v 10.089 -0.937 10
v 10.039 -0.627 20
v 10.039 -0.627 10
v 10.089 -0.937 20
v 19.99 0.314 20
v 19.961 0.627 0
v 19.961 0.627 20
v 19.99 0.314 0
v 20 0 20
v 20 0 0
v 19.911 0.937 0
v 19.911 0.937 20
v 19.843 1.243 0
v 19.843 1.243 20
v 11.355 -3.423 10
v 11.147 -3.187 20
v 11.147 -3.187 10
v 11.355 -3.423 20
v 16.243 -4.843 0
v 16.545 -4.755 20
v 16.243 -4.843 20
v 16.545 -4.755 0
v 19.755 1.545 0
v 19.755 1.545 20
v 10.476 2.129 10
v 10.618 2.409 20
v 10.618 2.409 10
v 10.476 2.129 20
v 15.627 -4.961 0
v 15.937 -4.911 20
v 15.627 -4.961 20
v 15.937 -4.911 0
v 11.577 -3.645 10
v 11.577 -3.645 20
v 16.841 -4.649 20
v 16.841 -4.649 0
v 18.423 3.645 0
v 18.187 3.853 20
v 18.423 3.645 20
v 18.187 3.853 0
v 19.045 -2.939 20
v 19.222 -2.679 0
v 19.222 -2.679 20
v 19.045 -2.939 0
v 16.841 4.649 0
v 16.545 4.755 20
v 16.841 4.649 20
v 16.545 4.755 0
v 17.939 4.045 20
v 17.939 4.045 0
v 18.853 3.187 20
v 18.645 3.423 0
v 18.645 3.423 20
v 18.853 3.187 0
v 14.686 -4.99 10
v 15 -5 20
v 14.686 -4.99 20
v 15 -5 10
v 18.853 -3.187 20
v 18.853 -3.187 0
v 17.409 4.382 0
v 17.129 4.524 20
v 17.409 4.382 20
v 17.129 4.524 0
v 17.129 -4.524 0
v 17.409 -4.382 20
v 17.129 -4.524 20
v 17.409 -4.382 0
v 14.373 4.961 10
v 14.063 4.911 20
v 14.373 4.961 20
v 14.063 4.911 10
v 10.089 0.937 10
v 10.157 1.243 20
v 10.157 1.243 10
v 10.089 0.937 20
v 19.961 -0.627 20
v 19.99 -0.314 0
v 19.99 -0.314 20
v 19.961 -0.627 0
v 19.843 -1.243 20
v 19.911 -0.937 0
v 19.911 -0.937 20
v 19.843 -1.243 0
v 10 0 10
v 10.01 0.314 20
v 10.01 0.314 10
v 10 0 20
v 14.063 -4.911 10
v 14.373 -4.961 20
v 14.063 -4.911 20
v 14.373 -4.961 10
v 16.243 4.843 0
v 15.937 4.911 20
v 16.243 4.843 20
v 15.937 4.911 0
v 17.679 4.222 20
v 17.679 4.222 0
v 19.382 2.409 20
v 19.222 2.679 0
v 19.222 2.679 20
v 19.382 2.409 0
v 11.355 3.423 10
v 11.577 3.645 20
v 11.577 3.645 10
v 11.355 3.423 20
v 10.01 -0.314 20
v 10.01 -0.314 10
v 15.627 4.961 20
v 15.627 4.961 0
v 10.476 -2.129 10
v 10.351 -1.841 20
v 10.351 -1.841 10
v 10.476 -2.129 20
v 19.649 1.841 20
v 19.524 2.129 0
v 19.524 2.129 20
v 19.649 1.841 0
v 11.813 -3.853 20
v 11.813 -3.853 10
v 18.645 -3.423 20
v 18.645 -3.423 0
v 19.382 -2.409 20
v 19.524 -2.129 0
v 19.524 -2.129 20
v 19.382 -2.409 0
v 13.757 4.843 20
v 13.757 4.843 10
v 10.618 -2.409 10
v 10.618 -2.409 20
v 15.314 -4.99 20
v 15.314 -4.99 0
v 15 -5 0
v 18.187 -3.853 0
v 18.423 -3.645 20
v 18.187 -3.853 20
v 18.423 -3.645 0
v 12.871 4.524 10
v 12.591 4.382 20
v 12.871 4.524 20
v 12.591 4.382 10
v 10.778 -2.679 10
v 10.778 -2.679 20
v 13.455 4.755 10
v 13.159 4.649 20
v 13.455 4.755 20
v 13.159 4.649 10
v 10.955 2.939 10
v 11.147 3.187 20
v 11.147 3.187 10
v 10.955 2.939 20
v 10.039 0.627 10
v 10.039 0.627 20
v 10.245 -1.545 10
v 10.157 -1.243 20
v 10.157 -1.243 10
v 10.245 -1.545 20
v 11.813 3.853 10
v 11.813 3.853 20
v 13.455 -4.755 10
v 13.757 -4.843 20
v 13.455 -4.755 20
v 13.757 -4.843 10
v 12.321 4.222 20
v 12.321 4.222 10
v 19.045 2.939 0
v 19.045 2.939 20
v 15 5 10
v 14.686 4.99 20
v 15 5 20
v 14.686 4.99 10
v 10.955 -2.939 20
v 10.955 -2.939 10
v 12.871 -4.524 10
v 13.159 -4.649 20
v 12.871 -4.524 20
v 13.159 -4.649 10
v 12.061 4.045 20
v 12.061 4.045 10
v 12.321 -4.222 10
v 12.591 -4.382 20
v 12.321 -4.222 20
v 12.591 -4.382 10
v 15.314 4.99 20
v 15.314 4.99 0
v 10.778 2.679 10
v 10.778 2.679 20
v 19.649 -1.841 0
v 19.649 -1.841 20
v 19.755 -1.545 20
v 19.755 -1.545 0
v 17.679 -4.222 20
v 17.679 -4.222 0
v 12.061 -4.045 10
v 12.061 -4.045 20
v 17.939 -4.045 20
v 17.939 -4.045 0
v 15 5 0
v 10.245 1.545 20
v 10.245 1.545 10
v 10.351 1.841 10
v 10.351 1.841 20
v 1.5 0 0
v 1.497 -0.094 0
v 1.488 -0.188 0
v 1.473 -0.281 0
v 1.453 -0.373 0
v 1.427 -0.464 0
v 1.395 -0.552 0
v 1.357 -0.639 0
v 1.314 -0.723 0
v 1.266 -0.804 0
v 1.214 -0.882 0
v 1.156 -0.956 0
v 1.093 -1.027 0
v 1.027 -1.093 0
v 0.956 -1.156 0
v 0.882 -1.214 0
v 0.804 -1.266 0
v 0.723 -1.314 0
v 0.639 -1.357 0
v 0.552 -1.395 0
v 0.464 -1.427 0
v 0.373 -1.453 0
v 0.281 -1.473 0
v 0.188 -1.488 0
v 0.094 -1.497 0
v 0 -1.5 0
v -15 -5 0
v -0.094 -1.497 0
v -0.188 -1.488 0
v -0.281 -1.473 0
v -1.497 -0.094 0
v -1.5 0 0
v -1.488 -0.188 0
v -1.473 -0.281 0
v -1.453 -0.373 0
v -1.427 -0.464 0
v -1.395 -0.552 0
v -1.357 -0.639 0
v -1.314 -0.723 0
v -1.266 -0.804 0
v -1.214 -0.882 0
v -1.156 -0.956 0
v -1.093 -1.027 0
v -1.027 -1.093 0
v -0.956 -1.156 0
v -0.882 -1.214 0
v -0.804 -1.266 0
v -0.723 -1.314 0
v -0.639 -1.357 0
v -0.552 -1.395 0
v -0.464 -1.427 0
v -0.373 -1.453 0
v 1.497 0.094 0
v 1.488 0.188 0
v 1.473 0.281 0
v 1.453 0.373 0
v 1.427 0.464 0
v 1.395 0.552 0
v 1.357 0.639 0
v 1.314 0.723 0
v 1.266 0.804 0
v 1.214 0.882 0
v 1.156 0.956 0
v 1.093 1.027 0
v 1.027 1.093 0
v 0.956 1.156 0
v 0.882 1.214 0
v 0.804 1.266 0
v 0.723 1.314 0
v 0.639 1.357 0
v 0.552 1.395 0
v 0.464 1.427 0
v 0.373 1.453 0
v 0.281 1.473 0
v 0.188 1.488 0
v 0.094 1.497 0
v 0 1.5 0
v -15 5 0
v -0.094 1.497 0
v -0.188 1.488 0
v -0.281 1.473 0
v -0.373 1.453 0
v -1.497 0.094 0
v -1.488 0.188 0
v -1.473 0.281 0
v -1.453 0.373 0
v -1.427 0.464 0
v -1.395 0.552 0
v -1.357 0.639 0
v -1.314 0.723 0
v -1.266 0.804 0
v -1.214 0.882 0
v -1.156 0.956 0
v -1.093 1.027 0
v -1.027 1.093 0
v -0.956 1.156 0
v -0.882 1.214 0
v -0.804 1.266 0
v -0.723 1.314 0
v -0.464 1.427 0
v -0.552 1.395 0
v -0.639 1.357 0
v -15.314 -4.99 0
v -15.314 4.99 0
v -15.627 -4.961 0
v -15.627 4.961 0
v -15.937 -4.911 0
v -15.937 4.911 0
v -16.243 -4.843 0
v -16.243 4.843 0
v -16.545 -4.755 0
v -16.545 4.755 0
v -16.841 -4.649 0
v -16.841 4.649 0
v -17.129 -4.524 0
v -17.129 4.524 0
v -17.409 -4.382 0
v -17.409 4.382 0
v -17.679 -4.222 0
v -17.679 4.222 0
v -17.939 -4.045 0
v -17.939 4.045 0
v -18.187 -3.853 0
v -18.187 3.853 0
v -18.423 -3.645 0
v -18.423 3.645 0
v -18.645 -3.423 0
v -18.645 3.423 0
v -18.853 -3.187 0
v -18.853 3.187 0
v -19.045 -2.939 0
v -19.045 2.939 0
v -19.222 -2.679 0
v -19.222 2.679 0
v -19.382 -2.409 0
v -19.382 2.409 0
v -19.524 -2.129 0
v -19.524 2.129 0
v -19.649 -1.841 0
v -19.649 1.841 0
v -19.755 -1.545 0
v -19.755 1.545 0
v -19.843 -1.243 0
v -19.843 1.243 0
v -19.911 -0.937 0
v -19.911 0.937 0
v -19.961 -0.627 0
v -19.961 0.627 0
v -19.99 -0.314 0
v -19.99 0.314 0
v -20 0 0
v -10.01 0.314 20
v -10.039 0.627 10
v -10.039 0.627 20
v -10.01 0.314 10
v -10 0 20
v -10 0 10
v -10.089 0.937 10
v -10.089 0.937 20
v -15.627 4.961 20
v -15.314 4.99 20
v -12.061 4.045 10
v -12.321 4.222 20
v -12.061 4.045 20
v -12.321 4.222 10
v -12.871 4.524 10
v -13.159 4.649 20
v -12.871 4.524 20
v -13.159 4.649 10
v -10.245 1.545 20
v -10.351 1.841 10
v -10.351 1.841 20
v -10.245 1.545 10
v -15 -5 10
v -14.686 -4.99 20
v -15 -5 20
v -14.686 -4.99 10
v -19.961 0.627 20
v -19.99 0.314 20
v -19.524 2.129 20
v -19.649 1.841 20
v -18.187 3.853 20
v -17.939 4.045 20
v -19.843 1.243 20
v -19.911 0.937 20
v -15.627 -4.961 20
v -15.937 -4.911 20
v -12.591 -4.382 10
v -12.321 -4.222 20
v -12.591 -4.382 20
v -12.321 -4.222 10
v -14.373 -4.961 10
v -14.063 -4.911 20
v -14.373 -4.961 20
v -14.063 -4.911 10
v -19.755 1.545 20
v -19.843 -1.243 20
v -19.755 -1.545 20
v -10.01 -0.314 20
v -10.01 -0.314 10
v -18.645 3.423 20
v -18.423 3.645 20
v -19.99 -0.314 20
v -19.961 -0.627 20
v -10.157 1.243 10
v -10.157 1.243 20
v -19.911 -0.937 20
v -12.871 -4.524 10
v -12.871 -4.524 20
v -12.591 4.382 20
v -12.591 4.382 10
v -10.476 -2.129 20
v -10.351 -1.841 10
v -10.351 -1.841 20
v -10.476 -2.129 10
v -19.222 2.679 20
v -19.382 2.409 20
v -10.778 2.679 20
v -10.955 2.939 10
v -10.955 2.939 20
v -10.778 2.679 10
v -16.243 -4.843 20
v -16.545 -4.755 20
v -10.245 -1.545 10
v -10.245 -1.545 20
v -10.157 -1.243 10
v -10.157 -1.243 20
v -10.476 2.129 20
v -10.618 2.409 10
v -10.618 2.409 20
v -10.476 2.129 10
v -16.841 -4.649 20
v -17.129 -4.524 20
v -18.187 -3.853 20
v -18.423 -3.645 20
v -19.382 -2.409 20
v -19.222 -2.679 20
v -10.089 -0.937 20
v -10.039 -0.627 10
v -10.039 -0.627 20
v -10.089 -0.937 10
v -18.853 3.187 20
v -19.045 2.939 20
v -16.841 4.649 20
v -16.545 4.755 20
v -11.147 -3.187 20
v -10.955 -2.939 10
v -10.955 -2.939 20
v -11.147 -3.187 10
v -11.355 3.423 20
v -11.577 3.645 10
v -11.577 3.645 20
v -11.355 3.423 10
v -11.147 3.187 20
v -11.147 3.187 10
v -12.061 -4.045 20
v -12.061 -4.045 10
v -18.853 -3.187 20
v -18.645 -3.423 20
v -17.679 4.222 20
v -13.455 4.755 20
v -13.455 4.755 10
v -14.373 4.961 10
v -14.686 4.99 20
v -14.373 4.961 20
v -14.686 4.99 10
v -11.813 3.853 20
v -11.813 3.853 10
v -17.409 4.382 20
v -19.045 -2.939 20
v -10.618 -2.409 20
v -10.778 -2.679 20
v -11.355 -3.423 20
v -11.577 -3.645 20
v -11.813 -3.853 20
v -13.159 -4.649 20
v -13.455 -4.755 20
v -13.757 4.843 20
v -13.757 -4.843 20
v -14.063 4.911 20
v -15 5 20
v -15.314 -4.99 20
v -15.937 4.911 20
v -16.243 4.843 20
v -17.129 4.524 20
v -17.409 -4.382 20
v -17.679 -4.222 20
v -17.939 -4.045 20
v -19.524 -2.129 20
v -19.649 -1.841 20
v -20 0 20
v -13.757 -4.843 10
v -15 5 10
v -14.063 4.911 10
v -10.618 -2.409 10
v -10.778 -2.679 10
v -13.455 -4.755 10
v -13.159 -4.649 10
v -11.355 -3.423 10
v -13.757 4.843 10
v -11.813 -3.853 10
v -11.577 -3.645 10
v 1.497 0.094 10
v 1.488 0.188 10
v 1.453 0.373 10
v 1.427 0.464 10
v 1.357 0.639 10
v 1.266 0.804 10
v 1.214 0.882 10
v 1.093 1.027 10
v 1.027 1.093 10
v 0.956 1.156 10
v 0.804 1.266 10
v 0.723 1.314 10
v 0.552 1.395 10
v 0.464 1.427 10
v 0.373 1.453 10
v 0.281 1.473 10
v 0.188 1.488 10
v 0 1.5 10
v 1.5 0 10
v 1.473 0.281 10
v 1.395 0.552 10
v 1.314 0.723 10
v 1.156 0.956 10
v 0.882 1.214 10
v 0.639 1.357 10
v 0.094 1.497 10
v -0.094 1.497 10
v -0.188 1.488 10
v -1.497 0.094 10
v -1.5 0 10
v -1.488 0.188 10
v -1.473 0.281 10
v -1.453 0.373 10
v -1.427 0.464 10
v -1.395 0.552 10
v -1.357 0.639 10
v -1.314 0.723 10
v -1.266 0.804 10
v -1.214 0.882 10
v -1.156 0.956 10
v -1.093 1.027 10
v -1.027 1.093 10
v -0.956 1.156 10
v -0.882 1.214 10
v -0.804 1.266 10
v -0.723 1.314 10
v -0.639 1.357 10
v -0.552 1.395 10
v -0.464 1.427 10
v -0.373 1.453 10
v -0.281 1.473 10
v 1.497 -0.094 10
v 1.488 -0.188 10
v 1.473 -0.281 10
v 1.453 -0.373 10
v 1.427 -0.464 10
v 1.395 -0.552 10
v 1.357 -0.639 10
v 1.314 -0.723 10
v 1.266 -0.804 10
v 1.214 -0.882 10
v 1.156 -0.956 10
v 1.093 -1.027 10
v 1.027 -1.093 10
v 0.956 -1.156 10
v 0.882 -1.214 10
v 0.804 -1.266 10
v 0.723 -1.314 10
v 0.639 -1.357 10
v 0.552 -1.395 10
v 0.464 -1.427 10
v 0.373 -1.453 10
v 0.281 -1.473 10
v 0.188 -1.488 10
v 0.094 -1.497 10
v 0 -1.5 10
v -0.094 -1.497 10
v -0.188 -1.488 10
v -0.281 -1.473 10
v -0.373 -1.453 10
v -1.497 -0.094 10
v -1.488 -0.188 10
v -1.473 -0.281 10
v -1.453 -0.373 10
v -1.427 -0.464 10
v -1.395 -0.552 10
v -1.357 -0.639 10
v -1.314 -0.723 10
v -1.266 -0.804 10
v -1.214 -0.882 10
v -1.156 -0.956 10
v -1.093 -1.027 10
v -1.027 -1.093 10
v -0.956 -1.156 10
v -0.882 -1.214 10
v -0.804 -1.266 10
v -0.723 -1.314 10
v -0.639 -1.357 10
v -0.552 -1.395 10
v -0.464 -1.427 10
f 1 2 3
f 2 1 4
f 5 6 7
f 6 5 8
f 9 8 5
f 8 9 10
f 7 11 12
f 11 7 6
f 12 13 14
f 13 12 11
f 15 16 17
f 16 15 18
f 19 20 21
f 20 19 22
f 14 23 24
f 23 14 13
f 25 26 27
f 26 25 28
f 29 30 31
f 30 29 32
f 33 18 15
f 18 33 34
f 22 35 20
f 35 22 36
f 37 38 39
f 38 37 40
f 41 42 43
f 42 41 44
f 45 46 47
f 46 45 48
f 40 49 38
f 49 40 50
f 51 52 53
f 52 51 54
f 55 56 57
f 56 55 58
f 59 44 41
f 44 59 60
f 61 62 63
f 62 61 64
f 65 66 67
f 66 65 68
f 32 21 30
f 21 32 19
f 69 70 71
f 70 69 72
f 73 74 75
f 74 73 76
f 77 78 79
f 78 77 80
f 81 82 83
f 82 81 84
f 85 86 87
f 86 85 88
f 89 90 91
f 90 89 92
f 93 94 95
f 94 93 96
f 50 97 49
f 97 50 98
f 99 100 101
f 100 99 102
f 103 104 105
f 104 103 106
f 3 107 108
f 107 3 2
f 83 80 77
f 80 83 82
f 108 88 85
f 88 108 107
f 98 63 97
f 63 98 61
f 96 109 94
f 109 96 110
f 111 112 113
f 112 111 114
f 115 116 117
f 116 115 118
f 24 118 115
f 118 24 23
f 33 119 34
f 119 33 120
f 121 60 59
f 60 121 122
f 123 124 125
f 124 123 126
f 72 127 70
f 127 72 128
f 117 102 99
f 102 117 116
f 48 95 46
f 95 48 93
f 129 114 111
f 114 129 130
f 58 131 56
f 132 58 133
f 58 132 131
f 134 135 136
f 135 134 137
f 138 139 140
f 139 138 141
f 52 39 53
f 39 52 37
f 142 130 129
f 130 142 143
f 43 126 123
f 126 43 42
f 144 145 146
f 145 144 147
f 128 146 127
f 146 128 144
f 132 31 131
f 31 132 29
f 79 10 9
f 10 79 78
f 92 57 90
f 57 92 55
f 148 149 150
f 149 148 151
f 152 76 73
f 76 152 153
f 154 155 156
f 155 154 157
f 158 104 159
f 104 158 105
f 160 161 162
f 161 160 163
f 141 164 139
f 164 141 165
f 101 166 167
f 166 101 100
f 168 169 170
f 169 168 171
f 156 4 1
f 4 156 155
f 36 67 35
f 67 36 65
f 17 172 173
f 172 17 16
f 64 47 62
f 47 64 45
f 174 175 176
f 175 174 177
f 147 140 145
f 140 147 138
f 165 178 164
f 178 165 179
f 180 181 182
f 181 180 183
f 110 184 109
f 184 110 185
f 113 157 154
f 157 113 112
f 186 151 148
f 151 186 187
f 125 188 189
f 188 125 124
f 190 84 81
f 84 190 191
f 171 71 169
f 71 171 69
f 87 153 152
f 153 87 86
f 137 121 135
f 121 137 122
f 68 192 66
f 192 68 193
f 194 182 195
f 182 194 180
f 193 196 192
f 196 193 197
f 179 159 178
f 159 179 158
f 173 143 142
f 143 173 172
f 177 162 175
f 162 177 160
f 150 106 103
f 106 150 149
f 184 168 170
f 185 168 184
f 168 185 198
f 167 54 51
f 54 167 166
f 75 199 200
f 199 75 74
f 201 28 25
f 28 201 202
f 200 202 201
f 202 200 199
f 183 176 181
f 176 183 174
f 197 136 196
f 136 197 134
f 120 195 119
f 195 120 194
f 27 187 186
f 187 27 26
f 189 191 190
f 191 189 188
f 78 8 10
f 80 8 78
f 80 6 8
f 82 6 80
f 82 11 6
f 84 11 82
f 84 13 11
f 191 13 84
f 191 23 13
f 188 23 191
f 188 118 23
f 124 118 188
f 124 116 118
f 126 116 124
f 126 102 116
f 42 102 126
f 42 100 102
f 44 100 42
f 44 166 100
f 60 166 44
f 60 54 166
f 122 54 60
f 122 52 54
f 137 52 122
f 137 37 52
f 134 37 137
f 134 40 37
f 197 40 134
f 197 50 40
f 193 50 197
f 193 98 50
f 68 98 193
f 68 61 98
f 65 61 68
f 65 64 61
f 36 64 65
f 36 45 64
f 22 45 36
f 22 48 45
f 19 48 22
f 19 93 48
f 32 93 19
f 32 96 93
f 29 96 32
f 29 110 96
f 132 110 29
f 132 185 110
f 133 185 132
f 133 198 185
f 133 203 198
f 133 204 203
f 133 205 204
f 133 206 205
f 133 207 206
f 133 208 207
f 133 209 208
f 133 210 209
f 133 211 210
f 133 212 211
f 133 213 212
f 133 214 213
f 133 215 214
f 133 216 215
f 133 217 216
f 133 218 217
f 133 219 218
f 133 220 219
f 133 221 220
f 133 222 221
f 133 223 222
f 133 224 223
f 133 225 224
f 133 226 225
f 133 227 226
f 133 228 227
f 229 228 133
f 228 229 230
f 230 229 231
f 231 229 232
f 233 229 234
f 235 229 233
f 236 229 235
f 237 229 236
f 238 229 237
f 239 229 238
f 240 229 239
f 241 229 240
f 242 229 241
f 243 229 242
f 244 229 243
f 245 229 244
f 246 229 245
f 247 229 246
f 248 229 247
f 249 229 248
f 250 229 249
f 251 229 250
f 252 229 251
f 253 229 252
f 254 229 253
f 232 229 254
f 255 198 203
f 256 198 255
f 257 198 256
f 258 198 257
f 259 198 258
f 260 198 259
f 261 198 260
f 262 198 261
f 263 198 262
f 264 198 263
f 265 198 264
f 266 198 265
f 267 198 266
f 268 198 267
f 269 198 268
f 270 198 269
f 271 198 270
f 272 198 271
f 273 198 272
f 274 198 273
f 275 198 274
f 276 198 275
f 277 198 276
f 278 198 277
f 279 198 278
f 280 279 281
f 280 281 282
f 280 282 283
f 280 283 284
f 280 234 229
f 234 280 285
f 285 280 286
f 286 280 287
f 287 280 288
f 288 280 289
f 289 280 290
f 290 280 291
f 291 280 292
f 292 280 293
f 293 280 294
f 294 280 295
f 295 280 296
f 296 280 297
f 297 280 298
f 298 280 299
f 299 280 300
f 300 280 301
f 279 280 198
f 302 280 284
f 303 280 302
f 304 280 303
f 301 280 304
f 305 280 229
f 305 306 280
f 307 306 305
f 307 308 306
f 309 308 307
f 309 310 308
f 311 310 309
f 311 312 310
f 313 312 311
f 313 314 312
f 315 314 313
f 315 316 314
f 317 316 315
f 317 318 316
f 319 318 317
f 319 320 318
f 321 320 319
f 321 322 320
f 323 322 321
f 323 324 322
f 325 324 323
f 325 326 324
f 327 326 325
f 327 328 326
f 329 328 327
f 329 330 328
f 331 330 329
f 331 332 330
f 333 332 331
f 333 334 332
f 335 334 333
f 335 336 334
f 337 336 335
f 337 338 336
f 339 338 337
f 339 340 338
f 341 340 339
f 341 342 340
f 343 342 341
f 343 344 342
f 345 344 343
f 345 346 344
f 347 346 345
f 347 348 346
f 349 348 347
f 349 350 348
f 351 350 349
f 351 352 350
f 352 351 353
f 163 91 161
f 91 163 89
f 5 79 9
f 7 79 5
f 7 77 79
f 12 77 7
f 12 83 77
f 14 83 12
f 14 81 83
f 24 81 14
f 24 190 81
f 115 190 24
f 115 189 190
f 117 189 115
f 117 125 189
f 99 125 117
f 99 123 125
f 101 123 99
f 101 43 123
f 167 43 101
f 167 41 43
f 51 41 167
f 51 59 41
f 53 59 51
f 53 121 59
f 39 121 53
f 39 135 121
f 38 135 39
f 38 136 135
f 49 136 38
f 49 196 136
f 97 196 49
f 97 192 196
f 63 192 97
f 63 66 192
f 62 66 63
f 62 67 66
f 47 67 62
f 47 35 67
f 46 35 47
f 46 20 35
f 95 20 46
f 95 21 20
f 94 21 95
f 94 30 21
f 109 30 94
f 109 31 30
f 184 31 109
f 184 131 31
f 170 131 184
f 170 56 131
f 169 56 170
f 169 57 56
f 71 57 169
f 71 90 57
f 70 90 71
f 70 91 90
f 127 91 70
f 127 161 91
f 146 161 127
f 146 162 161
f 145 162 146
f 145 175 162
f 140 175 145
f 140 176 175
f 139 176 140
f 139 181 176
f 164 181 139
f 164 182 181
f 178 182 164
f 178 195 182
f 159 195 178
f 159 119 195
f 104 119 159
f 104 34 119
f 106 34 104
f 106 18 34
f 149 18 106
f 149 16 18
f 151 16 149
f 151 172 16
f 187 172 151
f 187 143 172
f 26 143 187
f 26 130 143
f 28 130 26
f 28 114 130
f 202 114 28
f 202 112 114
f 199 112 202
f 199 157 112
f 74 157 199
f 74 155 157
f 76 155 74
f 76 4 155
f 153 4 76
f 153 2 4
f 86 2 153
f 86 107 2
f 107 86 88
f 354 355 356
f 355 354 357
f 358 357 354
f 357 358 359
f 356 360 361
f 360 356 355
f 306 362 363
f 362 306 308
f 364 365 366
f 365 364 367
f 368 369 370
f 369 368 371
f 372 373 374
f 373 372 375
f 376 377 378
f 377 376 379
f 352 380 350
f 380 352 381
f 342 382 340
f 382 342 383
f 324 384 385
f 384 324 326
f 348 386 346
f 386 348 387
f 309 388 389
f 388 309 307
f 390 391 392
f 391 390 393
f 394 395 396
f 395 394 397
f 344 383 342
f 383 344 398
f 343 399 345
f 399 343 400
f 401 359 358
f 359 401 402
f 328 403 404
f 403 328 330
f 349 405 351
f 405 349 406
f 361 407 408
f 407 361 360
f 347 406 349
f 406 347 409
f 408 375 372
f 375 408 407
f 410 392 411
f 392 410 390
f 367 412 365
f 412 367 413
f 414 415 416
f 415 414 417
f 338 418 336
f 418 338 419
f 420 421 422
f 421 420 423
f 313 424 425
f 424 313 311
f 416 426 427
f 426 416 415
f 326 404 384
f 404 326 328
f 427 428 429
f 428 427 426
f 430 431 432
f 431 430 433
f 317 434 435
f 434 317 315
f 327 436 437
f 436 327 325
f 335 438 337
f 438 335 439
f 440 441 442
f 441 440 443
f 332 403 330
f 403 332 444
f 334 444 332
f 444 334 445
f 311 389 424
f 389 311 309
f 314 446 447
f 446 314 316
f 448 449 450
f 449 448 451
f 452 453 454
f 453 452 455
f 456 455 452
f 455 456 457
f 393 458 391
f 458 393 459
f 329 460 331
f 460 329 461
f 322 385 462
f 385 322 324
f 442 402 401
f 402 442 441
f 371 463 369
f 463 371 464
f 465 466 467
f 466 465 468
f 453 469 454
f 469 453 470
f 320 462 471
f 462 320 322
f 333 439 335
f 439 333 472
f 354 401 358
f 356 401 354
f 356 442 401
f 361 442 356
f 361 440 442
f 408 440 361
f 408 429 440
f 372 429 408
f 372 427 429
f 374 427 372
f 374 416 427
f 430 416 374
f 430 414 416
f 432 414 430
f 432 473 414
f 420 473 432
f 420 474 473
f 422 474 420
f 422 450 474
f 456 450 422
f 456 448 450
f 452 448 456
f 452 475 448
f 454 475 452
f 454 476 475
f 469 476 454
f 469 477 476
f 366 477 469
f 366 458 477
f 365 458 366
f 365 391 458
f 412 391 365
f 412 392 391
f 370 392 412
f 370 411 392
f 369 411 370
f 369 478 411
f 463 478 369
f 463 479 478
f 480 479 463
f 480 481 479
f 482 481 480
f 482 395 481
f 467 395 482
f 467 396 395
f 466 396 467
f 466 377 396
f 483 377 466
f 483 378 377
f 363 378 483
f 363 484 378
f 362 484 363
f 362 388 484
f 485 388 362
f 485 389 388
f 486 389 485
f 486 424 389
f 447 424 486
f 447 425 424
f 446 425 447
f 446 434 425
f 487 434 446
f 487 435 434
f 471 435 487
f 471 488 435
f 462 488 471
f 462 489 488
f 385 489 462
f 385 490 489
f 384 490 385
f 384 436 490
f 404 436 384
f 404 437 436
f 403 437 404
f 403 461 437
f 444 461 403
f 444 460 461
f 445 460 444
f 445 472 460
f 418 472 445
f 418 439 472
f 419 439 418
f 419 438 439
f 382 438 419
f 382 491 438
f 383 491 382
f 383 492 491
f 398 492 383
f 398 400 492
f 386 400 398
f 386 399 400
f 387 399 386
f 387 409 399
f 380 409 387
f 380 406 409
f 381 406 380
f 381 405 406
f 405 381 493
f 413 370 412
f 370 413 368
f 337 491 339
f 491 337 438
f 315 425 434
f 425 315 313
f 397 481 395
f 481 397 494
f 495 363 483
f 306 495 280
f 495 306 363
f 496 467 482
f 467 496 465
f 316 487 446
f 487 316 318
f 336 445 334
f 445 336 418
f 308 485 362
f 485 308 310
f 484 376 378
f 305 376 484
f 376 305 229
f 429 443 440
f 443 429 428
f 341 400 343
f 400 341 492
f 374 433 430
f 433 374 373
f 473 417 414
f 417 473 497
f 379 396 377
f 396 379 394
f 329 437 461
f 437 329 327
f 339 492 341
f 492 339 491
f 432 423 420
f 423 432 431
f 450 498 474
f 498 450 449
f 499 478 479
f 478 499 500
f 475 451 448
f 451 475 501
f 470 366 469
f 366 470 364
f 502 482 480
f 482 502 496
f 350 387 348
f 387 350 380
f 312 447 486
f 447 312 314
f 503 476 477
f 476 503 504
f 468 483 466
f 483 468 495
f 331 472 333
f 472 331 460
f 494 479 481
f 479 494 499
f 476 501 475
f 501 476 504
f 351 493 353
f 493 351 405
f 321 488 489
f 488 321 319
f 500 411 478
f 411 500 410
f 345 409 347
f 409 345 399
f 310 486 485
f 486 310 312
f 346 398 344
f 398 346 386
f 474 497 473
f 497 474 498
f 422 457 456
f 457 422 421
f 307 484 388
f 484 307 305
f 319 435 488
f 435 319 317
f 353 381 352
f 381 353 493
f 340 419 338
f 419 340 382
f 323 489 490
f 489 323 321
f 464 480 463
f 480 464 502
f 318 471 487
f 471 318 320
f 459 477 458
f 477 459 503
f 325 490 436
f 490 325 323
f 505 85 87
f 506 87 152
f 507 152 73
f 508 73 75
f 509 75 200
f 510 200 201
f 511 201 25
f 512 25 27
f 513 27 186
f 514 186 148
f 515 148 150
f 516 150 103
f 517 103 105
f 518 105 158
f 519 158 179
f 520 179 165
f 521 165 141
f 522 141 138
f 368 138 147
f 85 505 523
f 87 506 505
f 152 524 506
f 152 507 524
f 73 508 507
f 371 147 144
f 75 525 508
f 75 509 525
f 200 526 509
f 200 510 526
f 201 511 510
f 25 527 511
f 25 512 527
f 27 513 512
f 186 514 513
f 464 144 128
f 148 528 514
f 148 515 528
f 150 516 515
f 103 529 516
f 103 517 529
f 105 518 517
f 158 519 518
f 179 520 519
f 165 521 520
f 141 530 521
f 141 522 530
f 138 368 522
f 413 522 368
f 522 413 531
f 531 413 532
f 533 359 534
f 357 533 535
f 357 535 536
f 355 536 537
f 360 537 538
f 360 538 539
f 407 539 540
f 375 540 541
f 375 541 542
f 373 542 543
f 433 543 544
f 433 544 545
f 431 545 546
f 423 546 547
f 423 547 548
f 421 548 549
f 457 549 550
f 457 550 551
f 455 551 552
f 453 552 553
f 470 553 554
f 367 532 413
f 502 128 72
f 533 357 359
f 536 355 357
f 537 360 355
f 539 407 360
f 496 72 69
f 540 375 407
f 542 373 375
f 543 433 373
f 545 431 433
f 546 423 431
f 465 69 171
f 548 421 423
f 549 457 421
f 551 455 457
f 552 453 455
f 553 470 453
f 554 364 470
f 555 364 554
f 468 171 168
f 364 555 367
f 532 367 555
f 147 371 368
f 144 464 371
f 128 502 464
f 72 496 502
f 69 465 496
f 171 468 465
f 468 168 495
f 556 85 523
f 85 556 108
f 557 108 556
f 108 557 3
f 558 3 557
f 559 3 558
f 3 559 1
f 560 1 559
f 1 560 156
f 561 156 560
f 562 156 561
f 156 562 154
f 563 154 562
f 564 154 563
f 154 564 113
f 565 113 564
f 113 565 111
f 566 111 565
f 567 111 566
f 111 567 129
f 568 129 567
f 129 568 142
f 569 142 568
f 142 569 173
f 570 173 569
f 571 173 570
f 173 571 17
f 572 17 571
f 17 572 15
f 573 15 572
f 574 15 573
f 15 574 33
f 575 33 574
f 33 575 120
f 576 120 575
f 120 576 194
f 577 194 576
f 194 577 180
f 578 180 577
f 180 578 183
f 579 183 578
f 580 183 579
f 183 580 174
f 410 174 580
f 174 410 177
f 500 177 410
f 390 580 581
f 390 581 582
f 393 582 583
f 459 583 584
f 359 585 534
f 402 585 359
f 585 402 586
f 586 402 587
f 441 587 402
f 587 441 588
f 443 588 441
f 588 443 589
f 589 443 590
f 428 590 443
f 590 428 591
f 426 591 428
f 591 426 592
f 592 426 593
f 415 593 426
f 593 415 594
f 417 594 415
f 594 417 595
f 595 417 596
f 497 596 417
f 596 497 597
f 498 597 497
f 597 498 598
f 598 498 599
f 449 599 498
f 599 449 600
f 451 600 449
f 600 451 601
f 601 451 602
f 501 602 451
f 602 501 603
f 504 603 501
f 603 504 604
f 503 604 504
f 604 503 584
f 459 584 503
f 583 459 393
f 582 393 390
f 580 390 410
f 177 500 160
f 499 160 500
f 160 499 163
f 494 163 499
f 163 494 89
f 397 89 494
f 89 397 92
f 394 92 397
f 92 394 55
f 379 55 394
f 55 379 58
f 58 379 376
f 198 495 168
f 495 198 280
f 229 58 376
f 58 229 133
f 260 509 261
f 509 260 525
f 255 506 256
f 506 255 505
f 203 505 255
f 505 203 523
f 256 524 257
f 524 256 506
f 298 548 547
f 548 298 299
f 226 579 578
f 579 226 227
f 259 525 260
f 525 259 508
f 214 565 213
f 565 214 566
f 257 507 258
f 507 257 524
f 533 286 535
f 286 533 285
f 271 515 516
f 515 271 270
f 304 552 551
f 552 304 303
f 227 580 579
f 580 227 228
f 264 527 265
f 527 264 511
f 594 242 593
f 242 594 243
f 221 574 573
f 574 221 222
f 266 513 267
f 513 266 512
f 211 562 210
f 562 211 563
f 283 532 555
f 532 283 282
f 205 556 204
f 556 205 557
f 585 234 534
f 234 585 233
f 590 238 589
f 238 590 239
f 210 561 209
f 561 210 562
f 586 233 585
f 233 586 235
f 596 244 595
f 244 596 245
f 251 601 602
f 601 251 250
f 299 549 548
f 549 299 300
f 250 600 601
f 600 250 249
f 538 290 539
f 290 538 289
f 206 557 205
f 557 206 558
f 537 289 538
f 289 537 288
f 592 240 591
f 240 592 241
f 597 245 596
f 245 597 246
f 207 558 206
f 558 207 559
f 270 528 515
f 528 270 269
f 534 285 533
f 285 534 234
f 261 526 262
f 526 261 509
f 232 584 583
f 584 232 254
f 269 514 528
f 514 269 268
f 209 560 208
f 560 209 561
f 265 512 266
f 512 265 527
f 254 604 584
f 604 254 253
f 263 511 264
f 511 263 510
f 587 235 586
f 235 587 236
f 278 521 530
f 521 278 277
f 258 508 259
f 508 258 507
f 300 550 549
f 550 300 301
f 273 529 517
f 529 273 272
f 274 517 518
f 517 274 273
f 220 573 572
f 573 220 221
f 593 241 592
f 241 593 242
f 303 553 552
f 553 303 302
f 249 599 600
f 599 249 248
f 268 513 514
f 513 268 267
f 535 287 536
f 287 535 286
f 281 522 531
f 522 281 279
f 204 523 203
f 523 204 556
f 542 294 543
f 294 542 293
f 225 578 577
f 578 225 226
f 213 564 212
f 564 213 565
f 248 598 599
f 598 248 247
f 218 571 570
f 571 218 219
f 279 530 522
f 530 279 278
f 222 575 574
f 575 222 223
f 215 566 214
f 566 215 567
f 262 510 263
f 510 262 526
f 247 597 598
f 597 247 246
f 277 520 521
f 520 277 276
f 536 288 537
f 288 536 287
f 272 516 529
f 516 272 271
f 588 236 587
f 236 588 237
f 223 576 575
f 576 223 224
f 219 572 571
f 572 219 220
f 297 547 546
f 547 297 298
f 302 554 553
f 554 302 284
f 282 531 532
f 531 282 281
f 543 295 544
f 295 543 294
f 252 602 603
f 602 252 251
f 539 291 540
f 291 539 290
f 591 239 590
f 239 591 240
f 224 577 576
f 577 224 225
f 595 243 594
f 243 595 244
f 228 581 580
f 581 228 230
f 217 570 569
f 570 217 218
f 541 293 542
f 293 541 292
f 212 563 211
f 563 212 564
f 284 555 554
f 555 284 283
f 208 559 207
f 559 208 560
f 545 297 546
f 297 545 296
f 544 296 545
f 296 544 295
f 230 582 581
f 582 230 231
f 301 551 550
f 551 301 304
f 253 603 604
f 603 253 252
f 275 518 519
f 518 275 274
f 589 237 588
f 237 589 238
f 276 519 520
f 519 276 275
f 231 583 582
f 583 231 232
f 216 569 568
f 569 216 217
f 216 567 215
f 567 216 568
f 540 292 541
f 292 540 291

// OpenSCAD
width=30;
height=20;
depth=10;
hole=3;

difference() {
    union() {
        translate(v=[width/2, 0, 0])
            cylinder(h=height, d=depth, center=false, $fn=100);

        translate(v=[-width/2, 0, 0])
            cylinder(h=height, d=depth, center=false, $fn=100);

        translate(v=[-width/2, -5, 0])
            cube(size = [width, depth, height/2], center = false, $fn=100);
    }

    cylinder(h=height+2, d=hole, center=true, $fn=100);
}
